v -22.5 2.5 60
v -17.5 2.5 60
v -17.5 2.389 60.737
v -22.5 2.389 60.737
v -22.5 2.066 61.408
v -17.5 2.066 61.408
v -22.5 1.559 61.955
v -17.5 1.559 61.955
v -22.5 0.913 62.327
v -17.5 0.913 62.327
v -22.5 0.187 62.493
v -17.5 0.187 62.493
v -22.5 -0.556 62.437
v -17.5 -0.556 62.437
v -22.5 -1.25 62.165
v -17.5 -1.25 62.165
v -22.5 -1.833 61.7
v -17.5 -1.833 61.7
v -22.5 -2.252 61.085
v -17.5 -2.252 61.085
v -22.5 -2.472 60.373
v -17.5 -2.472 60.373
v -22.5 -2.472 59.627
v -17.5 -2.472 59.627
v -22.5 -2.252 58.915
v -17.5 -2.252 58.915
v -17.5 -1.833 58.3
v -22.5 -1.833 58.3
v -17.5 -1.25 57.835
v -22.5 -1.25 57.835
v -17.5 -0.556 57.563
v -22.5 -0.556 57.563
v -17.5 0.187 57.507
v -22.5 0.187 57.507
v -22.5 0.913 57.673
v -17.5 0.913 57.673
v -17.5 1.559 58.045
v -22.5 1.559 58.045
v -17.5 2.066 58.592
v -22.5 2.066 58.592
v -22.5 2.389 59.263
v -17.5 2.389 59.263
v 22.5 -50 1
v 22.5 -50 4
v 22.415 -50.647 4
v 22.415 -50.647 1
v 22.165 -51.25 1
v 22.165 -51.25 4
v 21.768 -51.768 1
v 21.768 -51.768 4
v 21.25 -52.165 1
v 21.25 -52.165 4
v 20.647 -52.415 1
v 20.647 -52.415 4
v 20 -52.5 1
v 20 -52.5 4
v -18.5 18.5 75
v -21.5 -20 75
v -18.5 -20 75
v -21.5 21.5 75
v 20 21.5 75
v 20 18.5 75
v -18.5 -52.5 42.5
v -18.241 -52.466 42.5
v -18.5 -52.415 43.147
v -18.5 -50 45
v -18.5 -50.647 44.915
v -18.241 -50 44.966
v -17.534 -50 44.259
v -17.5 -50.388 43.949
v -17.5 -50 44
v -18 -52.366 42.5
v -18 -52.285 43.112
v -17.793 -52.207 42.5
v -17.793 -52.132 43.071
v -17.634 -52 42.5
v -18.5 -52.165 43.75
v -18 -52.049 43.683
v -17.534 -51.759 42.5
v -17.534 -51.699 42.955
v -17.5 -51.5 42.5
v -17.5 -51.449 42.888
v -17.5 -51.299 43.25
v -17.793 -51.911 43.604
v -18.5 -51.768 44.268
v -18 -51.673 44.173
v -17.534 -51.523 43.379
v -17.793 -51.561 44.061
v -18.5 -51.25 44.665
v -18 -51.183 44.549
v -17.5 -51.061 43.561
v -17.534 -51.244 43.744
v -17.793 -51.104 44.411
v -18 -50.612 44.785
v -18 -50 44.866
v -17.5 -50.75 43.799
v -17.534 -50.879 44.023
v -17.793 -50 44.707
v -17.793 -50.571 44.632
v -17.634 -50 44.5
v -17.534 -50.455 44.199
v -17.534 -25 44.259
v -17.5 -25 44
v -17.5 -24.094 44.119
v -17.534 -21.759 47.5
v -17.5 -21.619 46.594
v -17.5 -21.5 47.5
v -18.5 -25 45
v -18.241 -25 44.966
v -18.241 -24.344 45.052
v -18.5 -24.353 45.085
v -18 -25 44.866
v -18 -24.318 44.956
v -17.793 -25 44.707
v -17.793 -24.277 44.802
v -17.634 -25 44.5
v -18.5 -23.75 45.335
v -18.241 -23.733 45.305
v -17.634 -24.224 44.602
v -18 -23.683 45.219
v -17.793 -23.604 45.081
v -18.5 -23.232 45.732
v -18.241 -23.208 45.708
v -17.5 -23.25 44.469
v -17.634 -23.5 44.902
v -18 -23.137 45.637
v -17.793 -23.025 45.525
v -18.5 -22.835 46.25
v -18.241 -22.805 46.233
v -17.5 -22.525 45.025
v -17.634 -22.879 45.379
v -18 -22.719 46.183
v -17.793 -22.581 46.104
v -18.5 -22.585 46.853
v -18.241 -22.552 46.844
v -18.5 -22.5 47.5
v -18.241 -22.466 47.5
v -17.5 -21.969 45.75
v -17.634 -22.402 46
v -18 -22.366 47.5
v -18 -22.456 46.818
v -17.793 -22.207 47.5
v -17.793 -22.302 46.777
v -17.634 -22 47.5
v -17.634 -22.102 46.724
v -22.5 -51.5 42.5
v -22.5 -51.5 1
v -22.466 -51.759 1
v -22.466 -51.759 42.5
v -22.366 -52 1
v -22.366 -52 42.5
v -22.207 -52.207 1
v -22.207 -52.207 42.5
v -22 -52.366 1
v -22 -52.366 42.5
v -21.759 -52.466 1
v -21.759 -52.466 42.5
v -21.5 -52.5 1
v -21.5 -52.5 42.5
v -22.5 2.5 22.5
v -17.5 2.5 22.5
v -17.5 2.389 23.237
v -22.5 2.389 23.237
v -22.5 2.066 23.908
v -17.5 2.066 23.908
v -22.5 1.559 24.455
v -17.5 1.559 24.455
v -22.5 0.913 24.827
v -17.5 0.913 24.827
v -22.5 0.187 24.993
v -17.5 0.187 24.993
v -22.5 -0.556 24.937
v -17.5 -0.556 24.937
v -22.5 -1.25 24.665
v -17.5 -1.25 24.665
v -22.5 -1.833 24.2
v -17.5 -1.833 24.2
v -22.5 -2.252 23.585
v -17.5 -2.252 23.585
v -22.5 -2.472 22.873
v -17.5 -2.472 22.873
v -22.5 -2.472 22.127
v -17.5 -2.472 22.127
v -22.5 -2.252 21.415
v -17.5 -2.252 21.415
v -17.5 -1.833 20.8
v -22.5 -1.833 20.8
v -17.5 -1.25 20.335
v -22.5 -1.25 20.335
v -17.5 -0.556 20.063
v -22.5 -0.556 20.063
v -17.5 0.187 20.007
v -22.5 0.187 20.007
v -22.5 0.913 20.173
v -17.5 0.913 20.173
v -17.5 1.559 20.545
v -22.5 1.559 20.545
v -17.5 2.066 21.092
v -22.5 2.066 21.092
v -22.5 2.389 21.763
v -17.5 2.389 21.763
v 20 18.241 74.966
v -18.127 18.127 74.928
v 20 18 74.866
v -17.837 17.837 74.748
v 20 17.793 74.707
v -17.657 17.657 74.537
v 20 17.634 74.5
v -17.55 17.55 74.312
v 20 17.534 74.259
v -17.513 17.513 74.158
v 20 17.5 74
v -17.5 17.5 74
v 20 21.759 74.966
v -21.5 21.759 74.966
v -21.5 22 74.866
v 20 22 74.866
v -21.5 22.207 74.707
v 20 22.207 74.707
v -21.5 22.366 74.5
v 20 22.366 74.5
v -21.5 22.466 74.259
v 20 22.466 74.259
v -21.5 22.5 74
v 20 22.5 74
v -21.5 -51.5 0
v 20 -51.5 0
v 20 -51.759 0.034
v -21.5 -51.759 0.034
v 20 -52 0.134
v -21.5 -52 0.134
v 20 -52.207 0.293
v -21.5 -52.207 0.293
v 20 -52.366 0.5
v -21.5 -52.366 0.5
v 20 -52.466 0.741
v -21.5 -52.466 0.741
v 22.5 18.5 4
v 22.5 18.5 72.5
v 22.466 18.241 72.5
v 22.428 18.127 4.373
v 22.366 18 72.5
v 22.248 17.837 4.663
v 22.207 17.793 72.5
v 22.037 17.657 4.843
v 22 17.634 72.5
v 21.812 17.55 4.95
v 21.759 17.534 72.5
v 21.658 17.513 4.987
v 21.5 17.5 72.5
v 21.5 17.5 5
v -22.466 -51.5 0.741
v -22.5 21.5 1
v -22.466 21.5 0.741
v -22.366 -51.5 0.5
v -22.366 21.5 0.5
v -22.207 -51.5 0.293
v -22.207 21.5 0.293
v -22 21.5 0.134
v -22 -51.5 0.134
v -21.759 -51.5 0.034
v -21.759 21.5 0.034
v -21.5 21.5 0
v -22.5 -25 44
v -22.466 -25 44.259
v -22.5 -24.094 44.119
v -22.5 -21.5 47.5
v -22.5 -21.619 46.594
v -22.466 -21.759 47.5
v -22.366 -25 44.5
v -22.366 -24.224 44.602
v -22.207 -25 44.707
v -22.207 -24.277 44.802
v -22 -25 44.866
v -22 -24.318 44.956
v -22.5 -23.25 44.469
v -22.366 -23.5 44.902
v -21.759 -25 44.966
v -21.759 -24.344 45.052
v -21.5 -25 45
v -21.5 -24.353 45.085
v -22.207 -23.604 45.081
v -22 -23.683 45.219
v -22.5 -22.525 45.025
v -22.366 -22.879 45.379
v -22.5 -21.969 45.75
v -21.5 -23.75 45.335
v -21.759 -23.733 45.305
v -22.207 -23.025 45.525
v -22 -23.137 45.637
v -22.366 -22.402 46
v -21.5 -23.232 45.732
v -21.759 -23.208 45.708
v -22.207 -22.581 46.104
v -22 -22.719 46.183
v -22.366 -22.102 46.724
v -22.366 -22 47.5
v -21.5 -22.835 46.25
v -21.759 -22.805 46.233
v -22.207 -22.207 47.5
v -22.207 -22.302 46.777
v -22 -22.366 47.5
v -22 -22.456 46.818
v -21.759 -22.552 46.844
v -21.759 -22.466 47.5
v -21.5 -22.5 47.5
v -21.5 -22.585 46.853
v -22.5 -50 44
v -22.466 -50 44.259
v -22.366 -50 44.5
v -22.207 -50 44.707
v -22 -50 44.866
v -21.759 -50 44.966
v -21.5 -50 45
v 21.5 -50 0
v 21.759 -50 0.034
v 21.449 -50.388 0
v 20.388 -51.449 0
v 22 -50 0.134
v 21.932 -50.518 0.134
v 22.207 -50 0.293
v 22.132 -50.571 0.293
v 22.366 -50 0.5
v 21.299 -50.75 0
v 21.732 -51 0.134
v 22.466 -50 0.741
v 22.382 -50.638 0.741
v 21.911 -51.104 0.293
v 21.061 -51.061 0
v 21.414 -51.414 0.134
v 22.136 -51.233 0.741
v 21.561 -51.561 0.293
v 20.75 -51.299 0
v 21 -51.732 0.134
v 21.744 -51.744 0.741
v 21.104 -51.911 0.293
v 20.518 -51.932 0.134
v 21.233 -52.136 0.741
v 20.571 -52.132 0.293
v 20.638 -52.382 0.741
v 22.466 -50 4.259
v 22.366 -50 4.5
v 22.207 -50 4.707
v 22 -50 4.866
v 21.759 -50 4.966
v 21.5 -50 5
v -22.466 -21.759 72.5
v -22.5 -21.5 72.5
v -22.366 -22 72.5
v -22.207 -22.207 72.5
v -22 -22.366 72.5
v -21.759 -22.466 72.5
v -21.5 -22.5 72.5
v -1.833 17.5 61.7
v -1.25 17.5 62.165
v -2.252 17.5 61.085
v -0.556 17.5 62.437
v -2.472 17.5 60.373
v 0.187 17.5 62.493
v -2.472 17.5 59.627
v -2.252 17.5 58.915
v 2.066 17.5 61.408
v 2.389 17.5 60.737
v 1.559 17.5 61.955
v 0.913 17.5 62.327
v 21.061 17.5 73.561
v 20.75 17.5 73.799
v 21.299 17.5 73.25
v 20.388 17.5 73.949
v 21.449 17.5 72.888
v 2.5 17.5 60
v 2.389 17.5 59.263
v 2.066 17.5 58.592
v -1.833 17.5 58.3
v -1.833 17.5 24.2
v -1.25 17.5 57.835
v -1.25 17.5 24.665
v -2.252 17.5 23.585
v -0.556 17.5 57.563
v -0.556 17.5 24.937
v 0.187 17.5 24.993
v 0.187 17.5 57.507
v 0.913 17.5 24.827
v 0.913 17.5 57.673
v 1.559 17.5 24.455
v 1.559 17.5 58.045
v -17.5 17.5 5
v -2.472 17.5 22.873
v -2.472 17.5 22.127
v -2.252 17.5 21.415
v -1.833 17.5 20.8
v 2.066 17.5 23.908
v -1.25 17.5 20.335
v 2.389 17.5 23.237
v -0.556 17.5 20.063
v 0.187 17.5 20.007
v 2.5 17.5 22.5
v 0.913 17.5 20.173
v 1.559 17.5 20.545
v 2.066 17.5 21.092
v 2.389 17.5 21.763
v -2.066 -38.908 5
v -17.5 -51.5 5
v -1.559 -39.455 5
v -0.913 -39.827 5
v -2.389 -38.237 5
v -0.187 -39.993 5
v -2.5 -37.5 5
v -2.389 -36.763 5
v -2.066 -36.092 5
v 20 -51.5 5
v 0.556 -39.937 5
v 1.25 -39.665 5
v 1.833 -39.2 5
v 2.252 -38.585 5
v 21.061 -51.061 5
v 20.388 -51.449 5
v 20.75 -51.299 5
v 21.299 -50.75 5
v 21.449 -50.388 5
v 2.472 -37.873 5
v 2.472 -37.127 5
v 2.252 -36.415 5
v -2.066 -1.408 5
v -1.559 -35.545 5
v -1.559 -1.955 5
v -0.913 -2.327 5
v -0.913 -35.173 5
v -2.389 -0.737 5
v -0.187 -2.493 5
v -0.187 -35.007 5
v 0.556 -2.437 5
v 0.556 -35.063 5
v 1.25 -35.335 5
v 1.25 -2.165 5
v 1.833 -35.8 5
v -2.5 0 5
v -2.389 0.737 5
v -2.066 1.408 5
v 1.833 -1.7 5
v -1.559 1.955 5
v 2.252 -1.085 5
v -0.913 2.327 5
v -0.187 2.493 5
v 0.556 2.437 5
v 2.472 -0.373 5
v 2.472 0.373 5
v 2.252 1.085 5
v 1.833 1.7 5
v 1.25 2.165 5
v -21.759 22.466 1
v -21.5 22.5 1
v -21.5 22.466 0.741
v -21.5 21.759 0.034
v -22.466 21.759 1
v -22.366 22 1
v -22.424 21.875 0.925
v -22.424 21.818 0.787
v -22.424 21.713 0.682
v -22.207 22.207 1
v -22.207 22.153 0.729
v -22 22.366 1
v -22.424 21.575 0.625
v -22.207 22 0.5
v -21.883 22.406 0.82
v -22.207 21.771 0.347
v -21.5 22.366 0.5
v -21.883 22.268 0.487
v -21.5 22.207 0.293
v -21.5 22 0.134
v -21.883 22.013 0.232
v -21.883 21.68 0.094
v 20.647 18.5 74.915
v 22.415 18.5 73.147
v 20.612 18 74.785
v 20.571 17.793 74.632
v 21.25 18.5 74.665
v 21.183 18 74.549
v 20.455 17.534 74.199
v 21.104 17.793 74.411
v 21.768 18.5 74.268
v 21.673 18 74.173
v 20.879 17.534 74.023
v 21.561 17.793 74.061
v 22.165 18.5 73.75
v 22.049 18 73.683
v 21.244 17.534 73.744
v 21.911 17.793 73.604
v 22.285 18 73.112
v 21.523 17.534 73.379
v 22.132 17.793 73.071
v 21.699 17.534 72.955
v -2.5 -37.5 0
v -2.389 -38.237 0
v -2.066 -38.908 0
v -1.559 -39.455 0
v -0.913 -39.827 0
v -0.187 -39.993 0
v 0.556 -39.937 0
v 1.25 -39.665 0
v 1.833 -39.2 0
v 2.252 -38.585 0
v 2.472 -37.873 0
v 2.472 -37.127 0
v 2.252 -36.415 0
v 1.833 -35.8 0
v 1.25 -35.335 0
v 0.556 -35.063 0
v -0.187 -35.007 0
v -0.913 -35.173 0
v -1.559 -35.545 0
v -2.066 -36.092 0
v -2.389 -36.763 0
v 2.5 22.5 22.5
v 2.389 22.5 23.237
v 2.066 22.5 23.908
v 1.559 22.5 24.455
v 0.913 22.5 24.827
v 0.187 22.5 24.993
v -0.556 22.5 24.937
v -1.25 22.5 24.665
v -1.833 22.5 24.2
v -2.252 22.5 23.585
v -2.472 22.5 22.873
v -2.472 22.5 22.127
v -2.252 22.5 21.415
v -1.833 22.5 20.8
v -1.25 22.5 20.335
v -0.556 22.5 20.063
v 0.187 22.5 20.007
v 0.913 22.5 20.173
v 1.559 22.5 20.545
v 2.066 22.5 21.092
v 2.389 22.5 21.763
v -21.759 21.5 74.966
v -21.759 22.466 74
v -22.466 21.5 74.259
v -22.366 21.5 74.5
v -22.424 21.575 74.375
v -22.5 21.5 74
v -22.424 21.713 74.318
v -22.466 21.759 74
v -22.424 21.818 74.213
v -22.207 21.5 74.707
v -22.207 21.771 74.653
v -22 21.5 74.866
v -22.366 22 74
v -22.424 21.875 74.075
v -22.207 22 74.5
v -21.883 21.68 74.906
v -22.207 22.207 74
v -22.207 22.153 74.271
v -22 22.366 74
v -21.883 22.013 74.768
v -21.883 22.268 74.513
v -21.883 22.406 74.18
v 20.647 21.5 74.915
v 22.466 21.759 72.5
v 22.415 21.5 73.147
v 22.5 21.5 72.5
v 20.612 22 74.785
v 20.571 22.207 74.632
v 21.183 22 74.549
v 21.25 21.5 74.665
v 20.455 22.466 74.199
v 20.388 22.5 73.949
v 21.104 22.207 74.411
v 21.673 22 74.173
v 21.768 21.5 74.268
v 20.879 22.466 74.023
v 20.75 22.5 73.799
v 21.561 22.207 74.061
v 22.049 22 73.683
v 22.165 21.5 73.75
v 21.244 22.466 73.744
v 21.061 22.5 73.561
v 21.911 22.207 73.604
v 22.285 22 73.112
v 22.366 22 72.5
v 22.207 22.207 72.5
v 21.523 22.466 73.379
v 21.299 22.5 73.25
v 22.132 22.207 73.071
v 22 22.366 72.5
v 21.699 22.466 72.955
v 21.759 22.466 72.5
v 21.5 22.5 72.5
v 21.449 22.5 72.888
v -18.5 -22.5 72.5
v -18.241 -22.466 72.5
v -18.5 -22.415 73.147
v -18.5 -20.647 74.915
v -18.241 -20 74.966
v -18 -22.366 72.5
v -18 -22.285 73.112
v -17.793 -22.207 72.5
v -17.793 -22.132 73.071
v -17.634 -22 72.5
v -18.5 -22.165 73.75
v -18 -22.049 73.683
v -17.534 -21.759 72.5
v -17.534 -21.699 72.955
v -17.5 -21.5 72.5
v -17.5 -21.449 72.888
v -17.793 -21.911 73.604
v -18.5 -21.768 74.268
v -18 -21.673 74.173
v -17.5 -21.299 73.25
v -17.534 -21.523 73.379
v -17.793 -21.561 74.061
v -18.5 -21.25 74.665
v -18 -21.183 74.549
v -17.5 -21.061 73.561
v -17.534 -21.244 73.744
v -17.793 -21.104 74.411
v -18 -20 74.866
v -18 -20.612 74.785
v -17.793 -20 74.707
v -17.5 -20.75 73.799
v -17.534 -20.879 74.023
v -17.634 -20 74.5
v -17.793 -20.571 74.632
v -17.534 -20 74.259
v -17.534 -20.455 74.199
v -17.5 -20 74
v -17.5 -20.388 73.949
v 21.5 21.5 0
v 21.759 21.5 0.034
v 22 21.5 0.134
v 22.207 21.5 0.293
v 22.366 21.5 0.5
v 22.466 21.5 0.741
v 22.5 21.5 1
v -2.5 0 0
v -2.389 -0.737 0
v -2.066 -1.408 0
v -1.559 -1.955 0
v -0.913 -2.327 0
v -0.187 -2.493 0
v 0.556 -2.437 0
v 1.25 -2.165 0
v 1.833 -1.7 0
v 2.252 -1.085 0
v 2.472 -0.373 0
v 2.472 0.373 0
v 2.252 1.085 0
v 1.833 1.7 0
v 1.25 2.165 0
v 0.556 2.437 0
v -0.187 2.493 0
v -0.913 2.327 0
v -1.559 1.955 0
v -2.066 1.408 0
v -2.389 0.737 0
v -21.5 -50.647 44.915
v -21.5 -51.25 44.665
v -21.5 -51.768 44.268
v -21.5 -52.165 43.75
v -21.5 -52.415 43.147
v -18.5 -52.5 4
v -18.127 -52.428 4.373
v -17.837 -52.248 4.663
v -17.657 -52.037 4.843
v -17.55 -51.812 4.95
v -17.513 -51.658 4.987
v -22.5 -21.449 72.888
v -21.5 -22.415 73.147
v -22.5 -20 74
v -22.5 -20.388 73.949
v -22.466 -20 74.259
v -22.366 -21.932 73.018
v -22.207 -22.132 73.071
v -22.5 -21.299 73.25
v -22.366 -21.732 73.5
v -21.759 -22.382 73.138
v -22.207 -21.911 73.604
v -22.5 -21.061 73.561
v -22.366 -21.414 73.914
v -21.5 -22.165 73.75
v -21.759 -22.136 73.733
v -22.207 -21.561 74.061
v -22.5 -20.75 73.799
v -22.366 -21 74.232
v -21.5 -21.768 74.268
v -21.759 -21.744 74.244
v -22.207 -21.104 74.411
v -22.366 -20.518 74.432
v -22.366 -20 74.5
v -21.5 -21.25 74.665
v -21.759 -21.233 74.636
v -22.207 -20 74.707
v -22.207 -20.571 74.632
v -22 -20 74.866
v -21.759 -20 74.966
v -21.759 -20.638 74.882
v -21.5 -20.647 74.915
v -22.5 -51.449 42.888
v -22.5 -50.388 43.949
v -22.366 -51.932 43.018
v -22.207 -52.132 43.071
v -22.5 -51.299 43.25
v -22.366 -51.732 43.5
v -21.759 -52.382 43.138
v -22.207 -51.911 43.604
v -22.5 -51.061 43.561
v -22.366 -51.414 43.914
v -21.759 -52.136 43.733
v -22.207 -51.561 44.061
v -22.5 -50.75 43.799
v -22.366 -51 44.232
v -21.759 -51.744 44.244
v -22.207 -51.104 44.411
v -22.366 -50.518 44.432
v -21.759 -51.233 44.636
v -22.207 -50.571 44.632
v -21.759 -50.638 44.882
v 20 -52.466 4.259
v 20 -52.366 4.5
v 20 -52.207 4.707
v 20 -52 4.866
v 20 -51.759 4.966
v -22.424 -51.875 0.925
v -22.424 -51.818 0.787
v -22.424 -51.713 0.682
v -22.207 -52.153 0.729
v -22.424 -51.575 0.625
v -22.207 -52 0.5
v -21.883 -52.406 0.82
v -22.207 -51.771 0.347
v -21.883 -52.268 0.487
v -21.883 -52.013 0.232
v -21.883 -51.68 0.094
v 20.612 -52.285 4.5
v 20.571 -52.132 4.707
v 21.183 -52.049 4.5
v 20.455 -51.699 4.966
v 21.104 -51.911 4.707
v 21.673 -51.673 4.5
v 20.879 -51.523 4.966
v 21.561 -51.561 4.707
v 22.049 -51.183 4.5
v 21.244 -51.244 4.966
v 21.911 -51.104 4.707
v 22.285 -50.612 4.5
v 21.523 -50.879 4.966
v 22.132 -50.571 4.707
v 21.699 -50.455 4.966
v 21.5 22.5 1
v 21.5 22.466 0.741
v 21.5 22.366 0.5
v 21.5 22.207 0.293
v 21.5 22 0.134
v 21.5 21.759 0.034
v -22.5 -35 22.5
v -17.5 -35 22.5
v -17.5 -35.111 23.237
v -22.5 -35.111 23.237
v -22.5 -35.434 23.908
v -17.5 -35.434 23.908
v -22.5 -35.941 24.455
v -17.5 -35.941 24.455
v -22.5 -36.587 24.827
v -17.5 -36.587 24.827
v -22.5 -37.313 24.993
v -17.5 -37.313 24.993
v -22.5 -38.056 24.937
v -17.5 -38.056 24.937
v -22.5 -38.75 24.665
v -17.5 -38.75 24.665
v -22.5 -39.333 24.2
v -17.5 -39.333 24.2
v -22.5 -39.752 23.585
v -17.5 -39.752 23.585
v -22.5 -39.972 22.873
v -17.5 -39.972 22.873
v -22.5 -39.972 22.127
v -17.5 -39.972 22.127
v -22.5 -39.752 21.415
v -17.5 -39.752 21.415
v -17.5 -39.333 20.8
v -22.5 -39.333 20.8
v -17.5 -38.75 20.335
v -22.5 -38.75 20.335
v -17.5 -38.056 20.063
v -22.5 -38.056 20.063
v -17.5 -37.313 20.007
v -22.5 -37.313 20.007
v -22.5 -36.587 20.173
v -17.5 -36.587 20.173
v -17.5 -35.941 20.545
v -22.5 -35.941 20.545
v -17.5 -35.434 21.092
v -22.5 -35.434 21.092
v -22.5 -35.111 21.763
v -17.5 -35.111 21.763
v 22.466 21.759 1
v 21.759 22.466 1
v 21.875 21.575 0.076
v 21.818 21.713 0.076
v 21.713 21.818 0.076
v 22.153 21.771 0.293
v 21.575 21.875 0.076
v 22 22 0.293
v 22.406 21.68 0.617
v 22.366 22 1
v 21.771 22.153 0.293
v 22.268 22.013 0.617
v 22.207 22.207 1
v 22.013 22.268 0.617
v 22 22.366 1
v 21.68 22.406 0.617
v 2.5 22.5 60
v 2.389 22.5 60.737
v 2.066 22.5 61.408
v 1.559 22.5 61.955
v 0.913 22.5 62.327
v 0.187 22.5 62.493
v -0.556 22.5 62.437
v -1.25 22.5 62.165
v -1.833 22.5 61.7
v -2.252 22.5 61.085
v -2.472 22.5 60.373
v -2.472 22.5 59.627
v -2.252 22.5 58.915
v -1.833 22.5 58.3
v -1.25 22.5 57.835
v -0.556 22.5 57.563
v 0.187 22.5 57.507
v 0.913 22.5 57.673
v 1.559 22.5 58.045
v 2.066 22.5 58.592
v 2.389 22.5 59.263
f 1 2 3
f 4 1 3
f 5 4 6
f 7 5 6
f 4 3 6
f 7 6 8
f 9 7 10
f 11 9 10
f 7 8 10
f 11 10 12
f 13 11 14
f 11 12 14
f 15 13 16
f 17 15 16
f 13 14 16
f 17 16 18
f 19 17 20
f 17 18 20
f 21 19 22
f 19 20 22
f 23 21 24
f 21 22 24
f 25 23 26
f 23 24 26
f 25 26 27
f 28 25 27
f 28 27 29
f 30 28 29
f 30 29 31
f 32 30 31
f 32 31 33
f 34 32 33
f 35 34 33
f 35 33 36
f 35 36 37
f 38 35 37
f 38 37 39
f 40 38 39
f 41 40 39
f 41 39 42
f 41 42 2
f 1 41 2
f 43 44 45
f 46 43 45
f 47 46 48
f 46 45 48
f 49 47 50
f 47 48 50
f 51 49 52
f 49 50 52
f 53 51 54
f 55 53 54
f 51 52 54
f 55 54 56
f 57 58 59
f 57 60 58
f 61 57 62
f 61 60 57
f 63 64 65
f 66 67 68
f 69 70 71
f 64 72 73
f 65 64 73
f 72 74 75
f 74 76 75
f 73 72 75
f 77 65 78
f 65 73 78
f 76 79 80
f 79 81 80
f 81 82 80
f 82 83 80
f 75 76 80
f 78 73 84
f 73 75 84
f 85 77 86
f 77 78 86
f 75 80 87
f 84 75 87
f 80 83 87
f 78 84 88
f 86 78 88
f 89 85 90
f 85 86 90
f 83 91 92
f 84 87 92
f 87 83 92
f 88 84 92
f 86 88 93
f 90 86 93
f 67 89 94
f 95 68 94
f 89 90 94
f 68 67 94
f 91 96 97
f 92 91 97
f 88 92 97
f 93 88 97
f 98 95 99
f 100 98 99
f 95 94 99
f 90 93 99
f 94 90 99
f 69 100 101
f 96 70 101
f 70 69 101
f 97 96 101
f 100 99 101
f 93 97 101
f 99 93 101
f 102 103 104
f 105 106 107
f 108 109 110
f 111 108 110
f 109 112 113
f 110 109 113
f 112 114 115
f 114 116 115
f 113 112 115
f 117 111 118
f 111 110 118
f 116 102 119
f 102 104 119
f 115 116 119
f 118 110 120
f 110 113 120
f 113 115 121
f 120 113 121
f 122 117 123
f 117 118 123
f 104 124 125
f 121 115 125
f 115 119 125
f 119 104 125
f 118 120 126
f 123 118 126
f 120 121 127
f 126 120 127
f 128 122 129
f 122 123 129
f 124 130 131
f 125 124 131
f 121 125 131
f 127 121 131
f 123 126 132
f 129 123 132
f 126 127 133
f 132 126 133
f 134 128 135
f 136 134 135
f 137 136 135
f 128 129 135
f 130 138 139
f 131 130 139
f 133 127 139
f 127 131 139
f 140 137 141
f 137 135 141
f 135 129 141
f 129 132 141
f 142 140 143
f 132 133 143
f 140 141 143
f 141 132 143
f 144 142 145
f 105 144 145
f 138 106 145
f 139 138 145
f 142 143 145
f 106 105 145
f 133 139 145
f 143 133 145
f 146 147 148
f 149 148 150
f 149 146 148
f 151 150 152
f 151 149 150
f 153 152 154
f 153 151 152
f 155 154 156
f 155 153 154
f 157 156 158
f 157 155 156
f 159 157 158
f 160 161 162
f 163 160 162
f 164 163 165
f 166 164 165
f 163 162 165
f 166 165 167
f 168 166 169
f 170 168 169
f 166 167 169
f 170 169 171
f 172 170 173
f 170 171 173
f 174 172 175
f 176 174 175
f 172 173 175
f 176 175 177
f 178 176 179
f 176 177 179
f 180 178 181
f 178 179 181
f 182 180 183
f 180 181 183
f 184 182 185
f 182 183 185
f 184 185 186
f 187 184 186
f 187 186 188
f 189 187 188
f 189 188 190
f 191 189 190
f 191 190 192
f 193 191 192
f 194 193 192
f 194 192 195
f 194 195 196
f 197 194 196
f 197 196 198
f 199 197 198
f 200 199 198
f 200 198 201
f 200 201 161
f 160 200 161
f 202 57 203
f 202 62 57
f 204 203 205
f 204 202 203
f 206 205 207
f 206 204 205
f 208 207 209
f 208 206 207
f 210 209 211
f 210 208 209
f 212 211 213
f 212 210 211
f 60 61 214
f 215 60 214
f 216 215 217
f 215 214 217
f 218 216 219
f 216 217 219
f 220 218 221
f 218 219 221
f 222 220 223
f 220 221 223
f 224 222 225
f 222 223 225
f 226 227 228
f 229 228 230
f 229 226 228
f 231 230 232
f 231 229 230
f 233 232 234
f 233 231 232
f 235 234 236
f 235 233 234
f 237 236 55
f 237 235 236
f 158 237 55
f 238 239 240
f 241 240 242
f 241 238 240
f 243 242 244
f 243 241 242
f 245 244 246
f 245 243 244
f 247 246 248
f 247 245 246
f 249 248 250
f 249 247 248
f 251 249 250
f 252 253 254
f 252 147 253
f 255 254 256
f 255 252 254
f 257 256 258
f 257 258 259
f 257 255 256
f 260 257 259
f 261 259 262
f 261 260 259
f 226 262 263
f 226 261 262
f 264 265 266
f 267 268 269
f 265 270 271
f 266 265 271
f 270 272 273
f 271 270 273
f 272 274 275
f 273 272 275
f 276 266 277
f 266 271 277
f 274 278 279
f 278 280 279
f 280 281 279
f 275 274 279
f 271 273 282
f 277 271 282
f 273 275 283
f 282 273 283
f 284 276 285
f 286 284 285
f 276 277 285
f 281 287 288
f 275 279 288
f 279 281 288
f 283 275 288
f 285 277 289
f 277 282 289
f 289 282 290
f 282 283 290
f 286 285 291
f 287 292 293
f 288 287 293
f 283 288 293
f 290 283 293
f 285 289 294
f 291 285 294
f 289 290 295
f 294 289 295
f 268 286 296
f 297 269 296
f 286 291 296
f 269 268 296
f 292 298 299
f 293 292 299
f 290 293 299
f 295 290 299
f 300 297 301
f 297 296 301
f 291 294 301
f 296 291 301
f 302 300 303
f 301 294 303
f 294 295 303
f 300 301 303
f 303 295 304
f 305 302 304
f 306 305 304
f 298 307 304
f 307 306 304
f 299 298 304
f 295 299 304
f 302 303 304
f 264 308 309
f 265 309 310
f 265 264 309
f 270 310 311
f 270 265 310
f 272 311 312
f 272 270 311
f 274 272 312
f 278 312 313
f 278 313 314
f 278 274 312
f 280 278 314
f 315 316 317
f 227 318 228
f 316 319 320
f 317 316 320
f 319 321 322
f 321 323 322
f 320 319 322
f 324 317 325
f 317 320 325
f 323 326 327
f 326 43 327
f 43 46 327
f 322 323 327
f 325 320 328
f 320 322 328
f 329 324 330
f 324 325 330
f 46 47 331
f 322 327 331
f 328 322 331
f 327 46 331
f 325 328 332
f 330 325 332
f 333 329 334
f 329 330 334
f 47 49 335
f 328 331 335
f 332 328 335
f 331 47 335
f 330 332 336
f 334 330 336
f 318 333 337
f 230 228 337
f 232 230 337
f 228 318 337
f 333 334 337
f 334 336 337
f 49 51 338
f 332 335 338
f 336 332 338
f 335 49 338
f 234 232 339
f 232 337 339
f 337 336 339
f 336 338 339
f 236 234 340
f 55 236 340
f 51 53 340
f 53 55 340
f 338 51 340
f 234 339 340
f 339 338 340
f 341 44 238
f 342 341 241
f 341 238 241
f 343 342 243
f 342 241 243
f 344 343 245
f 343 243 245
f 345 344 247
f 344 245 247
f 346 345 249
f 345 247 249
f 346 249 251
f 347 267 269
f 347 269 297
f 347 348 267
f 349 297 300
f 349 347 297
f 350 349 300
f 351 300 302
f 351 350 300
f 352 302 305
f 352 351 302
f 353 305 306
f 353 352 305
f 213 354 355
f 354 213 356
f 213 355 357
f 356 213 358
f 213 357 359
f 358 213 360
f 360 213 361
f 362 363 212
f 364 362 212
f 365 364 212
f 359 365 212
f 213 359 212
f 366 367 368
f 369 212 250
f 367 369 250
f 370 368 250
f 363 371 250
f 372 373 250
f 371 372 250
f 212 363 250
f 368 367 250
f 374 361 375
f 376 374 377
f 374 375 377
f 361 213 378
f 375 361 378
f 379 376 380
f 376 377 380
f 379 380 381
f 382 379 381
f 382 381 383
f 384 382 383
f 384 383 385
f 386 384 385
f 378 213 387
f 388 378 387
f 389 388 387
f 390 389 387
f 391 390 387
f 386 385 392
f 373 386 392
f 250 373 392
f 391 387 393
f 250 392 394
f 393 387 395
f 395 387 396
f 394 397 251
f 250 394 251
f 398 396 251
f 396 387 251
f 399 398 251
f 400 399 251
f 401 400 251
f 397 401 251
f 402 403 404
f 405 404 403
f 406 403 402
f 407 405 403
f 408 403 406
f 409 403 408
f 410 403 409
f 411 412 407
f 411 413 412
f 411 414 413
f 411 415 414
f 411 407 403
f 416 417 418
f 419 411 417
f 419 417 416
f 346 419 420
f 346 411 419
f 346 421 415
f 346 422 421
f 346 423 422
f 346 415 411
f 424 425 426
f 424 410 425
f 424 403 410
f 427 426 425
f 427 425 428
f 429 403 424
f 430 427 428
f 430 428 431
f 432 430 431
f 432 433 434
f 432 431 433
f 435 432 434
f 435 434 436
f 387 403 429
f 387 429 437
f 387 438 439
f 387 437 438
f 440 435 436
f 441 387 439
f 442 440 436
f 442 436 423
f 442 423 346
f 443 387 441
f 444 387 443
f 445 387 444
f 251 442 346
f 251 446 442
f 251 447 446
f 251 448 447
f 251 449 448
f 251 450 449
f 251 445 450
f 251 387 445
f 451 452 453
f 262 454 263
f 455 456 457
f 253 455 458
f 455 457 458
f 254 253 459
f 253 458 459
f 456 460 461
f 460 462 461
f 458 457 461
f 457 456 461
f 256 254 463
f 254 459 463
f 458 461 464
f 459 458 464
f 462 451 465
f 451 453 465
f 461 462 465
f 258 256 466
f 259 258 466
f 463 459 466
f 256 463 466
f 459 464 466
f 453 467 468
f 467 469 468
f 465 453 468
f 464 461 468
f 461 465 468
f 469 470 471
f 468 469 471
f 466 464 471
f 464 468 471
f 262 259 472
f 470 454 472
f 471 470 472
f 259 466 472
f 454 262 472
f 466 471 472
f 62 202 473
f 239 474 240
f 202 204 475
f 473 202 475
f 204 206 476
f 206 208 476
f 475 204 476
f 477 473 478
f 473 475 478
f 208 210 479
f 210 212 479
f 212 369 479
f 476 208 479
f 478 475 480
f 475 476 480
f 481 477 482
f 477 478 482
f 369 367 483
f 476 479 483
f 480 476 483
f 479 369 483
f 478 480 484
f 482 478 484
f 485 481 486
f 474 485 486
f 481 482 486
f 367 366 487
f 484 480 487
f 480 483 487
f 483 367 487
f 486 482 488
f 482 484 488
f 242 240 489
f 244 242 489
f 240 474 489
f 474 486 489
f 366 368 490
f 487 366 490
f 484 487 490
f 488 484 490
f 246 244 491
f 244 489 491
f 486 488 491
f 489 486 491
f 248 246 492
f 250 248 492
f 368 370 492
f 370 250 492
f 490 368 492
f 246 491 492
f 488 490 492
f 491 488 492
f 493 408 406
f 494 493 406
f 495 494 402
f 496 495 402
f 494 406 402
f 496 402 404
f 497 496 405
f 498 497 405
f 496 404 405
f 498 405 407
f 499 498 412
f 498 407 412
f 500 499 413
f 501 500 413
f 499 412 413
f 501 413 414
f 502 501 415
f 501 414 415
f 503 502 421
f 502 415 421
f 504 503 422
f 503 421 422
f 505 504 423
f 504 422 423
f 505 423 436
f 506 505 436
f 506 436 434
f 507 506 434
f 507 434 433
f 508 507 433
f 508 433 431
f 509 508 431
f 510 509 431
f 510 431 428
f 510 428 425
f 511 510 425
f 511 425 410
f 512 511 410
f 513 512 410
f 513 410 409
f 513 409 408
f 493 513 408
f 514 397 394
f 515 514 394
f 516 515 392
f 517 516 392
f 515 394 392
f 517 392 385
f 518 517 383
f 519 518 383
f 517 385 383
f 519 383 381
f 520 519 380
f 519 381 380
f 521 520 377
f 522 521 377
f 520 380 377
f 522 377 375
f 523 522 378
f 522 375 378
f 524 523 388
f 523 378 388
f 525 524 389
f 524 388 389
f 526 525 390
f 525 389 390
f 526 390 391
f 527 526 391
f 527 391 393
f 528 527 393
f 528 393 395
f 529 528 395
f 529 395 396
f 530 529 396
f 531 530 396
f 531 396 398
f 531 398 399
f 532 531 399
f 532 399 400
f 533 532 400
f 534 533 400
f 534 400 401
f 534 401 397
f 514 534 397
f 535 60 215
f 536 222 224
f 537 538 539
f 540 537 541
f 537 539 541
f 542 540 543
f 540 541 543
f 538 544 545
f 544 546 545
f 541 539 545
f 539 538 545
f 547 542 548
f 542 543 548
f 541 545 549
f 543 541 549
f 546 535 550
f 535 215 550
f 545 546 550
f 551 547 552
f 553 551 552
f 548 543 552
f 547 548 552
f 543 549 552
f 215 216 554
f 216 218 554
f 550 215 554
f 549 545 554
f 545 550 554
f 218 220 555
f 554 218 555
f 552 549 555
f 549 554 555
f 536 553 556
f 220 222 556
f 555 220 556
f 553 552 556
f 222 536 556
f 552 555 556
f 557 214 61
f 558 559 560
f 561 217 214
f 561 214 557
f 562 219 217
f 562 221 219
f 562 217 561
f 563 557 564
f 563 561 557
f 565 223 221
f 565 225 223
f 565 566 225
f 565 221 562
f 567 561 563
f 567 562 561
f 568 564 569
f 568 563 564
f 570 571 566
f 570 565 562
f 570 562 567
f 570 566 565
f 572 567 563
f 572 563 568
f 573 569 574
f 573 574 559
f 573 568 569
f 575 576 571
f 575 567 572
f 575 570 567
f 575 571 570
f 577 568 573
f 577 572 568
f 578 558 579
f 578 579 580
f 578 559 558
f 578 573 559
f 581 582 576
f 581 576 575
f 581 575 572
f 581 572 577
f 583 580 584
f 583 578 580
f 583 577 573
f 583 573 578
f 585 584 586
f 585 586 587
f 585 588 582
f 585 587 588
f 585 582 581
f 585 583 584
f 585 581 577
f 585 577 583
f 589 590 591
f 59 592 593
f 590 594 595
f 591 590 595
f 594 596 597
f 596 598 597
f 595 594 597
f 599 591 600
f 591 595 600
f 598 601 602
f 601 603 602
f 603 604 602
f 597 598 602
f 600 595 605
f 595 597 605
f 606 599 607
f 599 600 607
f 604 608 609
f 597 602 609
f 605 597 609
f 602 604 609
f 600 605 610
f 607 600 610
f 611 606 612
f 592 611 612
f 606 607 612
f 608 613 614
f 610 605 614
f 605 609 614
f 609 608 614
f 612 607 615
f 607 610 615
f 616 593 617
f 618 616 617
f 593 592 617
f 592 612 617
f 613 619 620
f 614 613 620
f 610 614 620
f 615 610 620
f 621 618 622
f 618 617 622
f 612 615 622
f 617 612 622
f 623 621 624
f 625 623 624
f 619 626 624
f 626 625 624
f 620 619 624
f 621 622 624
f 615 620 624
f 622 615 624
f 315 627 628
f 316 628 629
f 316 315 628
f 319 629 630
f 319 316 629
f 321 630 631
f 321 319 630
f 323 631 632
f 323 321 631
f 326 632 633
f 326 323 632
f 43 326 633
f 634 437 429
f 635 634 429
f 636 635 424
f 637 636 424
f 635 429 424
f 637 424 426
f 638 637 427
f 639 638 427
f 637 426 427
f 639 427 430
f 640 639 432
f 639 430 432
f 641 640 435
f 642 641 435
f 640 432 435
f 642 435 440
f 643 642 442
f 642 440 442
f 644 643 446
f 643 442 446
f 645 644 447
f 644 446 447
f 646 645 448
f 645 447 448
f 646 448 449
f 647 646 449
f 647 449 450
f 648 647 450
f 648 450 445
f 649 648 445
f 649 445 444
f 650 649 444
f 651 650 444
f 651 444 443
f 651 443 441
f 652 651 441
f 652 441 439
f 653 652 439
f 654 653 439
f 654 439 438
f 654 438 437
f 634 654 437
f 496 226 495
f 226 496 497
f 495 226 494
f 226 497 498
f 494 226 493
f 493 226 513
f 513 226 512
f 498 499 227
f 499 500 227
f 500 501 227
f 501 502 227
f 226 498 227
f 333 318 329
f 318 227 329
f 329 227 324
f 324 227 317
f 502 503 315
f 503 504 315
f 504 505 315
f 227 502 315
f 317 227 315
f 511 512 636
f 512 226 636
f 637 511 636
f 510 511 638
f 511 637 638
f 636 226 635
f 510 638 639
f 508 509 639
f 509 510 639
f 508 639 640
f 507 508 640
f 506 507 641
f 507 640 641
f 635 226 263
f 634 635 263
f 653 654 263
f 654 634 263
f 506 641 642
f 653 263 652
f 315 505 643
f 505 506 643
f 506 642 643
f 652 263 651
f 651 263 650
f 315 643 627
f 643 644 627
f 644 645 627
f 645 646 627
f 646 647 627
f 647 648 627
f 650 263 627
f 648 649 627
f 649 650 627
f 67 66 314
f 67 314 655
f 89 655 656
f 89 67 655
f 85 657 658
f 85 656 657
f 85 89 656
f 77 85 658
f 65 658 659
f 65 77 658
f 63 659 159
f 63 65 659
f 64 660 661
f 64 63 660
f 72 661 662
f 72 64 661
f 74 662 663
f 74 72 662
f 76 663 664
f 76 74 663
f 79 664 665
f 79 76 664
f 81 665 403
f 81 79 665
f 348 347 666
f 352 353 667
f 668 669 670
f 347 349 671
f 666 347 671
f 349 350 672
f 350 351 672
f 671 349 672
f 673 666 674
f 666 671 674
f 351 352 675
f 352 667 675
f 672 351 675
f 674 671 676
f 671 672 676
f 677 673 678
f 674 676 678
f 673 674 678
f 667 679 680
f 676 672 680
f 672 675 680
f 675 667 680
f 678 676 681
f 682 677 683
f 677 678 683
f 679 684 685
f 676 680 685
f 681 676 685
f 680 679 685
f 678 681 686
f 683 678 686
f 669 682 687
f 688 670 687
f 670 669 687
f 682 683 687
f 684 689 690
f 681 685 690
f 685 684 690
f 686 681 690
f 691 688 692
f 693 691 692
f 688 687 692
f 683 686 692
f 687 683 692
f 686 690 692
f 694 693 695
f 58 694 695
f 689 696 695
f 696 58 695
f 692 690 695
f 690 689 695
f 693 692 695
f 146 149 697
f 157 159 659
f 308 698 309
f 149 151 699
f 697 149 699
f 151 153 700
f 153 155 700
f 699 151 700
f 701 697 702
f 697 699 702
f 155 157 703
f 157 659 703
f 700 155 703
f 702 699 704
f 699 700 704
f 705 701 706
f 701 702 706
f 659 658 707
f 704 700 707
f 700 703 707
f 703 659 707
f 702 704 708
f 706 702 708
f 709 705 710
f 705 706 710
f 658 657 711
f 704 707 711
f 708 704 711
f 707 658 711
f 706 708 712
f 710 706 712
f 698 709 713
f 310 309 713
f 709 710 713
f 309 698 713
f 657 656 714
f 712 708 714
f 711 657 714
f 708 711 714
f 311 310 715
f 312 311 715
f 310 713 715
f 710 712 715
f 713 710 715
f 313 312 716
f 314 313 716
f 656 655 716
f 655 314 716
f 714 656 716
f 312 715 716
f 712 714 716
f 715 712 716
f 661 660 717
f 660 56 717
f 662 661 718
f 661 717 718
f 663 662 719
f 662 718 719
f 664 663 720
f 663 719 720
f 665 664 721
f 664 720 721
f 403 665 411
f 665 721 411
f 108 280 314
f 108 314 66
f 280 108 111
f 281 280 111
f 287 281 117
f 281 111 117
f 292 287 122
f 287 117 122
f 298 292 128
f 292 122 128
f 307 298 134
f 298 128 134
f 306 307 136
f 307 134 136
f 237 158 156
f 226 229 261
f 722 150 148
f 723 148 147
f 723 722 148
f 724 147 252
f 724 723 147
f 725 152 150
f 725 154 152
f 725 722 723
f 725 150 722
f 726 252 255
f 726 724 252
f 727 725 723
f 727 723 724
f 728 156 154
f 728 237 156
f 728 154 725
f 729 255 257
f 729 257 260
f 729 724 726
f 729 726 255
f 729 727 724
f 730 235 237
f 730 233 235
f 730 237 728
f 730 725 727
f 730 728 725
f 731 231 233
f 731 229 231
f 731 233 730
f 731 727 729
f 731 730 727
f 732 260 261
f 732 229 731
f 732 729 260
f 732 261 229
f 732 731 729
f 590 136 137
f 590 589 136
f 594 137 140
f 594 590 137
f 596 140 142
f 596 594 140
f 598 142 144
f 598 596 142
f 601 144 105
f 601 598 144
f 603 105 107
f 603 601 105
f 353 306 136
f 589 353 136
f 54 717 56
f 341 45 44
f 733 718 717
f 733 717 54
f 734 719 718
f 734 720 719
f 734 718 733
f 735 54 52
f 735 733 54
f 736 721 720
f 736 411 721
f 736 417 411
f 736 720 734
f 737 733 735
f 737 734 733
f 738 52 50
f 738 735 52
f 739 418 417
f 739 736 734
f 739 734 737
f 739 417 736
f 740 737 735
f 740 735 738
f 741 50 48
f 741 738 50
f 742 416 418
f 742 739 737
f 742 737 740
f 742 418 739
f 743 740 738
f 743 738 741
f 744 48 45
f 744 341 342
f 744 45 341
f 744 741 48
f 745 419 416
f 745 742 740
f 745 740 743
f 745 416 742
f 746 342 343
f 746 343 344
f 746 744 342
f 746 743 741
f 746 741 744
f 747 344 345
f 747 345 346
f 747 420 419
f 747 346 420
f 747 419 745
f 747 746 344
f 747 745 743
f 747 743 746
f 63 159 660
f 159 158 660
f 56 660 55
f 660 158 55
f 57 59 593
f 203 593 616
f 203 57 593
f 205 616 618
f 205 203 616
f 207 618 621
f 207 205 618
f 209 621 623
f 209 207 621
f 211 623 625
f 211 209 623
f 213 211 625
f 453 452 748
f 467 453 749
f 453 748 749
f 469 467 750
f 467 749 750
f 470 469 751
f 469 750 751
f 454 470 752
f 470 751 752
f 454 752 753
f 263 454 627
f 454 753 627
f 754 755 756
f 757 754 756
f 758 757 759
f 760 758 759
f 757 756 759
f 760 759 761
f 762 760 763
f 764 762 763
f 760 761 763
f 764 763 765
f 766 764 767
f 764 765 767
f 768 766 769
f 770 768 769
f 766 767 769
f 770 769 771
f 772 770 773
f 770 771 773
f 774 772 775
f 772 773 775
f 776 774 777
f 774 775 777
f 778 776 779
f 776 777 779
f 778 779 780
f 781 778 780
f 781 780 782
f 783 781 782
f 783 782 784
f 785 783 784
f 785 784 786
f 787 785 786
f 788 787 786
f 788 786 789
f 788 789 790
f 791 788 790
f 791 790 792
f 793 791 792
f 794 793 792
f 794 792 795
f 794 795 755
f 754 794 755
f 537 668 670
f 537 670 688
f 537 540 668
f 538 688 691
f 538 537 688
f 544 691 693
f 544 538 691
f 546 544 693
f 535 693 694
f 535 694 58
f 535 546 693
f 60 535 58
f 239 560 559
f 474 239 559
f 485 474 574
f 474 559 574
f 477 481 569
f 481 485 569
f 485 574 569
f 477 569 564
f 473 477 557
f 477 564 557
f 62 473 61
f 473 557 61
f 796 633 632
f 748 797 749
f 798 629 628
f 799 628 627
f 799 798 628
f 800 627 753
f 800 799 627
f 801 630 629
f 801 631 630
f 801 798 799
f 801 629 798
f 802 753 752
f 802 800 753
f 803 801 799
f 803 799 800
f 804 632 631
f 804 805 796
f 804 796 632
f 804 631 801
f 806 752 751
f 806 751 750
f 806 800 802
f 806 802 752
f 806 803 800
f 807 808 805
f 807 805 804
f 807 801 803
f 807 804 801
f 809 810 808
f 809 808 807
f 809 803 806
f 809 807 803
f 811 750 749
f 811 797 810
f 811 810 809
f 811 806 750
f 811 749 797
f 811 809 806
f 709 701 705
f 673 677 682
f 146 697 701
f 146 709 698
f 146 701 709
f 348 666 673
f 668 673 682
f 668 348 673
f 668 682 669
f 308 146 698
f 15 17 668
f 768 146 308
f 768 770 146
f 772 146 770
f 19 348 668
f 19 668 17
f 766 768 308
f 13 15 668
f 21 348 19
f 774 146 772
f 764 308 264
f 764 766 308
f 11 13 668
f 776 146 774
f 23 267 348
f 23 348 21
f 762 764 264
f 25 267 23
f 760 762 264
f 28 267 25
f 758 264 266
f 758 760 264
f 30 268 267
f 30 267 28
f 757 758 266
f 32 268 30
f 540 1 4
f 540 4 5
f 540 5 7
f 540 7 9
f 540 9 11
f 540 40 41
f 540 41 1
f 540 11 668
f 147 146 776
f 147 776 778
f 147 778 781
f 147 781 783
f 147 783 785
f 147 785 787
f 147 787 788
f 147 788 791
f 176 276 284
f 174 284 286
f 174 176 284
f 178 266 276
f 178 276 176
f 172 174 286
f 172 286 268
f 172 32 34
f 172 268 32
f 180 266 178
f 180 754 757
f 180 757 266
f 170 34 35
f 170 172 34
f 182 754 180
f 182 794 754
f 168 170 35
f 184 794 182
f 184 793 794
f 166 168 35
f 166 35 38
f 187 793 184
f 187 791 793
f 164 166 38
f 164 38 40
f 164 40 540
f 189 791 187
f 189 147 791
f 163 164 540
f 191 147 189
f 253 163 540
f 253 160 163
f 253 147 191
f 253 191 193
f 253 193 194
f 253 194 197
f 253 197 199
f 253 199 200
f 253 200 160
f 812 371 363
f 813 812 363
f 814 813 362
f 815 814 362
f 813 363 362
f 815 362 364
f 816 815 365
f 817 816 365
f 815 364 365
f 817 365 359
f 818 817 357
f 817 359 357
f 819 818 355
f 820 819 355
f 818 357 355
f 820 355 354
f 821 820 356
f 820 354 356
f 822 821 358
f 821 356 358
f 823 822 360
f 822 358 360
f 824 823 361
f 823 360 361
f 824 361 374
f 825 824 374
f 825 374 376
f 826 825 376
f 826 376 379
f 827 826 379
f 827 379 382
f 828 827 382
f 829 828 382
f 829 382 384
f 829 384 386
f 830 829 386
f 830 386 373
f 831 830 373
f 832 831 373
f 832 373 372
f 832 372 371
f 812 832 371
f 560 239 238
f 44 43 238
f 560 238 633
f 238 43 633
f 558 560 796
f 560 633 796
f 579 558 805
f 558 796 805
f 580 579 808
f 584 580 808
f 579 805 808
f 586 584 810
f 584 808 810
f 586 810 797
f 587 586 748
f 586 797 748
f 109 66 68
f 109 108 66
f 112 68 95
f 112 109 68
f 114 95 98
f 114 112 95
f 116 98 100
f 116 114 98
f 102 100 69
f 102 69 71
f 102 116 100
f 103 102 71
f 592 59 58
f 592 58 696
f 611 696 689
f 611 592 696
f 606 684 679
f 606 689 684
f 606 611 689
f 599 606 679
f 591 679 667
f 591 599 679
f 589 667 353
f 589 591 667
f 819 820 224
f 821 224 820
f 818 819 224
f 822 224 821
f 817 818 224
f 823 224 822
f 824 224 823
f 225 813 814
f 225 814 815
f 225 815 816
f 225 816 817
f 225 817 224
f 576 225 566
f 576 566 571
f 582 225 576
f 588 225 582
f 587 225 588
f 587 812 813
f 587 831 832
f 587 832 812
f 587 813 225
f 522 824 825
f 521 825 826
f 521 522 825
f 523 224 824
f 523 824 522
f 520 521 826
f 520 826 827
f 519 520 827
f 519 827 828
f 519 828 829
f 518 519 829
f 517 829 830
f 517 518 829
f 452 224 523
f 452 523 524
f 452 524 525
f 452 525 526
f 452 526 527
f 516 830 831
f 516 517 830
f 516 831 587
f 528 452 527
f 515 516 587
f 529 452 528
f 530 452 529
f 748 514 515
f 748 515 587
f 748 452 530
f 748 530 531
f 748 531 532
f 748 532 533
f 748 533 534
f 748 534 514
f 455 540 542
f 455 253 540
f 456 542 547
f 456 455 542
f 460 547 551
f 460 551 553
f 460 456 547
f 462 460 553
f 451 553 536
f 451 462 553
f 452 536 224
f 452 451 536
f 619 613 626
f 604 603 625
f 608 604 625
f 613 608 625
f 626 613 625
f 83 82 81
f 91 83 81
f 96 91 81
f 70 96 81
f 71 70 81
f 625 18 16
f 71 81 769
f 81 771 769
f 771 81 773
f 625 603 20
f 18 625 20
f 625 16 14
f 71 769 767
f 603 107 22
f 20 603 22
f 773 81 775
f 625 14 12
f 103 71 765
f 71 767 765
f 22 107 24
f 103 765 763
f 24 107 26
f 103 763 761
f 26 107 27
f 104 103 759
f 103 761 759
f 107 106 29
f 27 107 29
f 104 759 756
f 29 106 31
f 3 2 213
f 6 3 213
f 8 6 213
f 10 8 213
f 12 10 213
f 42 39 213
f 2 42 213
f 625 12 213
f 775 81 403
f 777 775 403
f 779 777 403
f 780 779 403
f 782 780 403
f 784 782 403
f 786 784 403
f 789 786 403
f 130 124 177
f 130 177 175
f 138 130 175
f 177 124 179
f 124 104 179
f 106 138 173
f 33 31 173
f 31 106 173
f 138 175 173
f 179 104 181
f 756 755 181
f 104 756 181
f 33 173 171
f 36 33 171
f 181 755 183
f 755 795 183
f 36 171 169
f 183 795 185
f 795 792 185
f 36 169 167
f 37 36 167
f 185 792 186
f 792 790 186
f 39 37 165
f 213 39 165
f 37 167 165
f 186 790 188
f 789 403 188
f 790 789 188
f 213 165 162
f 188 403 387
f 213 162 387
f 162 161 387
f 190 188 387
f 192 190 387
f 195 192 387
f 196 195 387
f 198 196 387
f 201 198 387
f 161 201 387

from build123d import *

# Parameters (mm, degrees)
F0_W          = 45
F0_H          = 45
F1_DEPTH      = 45
F2_T          = -5
F3_DEPTH      = 30
F4_DEPTH      = 30
F10_D         = 5
F10_2_D       = 5
F10_ON_F6_D   = 5
F10_ON_F7_D   = 5
F10_ON_F9_D   = 5
F10_ON_F9_2_D = 5
F10_ON_F5_D   = 5
F12_R         = 2.5
F13_R         = 1


with BuildPart() as f1:
    # F0 (on Top) → F1 (new body)
    with BuildSketch(Plane.XY):
        Rectangle(F0_W, F0_H)
    extrude(amount=F1_DEPTH)

    # F2
    f2_openings = [f1.faces().sort_by_distance(p)[0] for p in [
        (0, 0, 45),
        (22.5, 0, 22.5),
        (0, -22.5, 22.5),
    ]]
    offset(amount=F2_T, openings=f2_openings)


with BuildPart() as f3:
    # F3 (new): a face of the model
    f3_faces = [f1.part.faces().sort_by_distance(p)[0] for p in [
        (21.8636038969, -22.5, 2.5),
    ]]
    extrude(f3_faces, amount=F3_DEPTH)

    # F10 on F9#2 (through all)
    with Locations(Plane(origin=(0, 0, 0), x_dir=(1, 0, 0), z_dir=(0, 0, -1))):
        with Locations((0, 0), (0, 37.5)):
            Hole(F10_ON_F9_2_D / 2)

    # F10 on F5 (through all)
    with Locations(Plane(origin=(-22.5, 0, 0), x_dir=(0, -1, 0), z_dir=(-1, 0, 0))):
        with Locations((37.5, 22.5)):
            Hole(F10_ON_F5_D / 2)


with BuildPart() as f4:
    # F4 (new): a face of the model
    f4_faces = [f1.part.faces().sort_by_distance(p)[0] for p in [
        (0, 21.8636038969, 45),
    ]]
    extrude(f4_faces, amount=F4_DEPTH)

    # F10#2 (through all)
    with Locations(Plane(origin=(0, 22.5, 0), x_dir=(-1, 0, 0), z_dir=(0, 1, 0))):
        with Locations((0, 60), (0, 22.5)):
            Hole(F10_2_D / 2)

    # F10 on F6 (through all)
    with Locations(Plane(origin=(-22.5, 0, 0), x_dir=(0, -1, 0), z_dir=(-1, 0, 0))):
        with Locations((0, 60)):
            Hole(F10_ON_F6_D / 2)


with BuildPart() as f1_1:
    add(f1.part)

    # F10 (through all)
    with Locations(Plane(origin=(0, 22.5, 0), x_dir=(-1, 0, 0), z_dir=(0, 1, 0))):
        with Locations((0, 60), (0, 22.5)):
            Hole(F10_D / 2)

    # F10 on F7 (through all)
    with Locations(Plane(origin=(-22.5, 0, 0), x_dir=(0, -1, 0), z_dir=(-1, 0, 0))):
        with Locations((0, 22.5)):
            Hole(F10_ON_F7_D / 2)

    # F10 on F9 (through all)
    with Locations(Plane(origin=(0, 0, 0), x_dir=(1, 0, 0), z_dir=(0, 0, -1))):
        with Locations((0, 0), (0, 37.5)):
            Hole(F10_ON_F9_D / 2)

    # F11: union F3, F4
    add(f3.part)
    add(f4.part)

    # F12
    f12_edges = [f1_1.edges().sort_by_distance(p)[0] for p in [
        (-20, -22.5, 45),
        (-20, -22.5, 75),
        (-20, -52.5, 45),
        (22.5, 20, 75),
        (22.5, -52.5, 2.5),
    ]]
    fillet(f12_edges, radius=F12_R)

    # F13
    f13_edges = [f1_1.edges().sort_by_distance(p)[0] for p in [
        (1.25, 17.5, 75),
        (-17.5, -1.25, 75),
        (1.25, -52.5, 5),
        (-1.25, 22.5, 75),
        (22.5, -13.75, 0),
        (0, 22.5, 0),
        (-22.5, 1.25, 75),
        (-22.5, 22.5, 37.5),
        (-22.5, -15, 0),
    ]]
    fillet(f13_edges, radius=F13_R)


solid = f1_1.part
